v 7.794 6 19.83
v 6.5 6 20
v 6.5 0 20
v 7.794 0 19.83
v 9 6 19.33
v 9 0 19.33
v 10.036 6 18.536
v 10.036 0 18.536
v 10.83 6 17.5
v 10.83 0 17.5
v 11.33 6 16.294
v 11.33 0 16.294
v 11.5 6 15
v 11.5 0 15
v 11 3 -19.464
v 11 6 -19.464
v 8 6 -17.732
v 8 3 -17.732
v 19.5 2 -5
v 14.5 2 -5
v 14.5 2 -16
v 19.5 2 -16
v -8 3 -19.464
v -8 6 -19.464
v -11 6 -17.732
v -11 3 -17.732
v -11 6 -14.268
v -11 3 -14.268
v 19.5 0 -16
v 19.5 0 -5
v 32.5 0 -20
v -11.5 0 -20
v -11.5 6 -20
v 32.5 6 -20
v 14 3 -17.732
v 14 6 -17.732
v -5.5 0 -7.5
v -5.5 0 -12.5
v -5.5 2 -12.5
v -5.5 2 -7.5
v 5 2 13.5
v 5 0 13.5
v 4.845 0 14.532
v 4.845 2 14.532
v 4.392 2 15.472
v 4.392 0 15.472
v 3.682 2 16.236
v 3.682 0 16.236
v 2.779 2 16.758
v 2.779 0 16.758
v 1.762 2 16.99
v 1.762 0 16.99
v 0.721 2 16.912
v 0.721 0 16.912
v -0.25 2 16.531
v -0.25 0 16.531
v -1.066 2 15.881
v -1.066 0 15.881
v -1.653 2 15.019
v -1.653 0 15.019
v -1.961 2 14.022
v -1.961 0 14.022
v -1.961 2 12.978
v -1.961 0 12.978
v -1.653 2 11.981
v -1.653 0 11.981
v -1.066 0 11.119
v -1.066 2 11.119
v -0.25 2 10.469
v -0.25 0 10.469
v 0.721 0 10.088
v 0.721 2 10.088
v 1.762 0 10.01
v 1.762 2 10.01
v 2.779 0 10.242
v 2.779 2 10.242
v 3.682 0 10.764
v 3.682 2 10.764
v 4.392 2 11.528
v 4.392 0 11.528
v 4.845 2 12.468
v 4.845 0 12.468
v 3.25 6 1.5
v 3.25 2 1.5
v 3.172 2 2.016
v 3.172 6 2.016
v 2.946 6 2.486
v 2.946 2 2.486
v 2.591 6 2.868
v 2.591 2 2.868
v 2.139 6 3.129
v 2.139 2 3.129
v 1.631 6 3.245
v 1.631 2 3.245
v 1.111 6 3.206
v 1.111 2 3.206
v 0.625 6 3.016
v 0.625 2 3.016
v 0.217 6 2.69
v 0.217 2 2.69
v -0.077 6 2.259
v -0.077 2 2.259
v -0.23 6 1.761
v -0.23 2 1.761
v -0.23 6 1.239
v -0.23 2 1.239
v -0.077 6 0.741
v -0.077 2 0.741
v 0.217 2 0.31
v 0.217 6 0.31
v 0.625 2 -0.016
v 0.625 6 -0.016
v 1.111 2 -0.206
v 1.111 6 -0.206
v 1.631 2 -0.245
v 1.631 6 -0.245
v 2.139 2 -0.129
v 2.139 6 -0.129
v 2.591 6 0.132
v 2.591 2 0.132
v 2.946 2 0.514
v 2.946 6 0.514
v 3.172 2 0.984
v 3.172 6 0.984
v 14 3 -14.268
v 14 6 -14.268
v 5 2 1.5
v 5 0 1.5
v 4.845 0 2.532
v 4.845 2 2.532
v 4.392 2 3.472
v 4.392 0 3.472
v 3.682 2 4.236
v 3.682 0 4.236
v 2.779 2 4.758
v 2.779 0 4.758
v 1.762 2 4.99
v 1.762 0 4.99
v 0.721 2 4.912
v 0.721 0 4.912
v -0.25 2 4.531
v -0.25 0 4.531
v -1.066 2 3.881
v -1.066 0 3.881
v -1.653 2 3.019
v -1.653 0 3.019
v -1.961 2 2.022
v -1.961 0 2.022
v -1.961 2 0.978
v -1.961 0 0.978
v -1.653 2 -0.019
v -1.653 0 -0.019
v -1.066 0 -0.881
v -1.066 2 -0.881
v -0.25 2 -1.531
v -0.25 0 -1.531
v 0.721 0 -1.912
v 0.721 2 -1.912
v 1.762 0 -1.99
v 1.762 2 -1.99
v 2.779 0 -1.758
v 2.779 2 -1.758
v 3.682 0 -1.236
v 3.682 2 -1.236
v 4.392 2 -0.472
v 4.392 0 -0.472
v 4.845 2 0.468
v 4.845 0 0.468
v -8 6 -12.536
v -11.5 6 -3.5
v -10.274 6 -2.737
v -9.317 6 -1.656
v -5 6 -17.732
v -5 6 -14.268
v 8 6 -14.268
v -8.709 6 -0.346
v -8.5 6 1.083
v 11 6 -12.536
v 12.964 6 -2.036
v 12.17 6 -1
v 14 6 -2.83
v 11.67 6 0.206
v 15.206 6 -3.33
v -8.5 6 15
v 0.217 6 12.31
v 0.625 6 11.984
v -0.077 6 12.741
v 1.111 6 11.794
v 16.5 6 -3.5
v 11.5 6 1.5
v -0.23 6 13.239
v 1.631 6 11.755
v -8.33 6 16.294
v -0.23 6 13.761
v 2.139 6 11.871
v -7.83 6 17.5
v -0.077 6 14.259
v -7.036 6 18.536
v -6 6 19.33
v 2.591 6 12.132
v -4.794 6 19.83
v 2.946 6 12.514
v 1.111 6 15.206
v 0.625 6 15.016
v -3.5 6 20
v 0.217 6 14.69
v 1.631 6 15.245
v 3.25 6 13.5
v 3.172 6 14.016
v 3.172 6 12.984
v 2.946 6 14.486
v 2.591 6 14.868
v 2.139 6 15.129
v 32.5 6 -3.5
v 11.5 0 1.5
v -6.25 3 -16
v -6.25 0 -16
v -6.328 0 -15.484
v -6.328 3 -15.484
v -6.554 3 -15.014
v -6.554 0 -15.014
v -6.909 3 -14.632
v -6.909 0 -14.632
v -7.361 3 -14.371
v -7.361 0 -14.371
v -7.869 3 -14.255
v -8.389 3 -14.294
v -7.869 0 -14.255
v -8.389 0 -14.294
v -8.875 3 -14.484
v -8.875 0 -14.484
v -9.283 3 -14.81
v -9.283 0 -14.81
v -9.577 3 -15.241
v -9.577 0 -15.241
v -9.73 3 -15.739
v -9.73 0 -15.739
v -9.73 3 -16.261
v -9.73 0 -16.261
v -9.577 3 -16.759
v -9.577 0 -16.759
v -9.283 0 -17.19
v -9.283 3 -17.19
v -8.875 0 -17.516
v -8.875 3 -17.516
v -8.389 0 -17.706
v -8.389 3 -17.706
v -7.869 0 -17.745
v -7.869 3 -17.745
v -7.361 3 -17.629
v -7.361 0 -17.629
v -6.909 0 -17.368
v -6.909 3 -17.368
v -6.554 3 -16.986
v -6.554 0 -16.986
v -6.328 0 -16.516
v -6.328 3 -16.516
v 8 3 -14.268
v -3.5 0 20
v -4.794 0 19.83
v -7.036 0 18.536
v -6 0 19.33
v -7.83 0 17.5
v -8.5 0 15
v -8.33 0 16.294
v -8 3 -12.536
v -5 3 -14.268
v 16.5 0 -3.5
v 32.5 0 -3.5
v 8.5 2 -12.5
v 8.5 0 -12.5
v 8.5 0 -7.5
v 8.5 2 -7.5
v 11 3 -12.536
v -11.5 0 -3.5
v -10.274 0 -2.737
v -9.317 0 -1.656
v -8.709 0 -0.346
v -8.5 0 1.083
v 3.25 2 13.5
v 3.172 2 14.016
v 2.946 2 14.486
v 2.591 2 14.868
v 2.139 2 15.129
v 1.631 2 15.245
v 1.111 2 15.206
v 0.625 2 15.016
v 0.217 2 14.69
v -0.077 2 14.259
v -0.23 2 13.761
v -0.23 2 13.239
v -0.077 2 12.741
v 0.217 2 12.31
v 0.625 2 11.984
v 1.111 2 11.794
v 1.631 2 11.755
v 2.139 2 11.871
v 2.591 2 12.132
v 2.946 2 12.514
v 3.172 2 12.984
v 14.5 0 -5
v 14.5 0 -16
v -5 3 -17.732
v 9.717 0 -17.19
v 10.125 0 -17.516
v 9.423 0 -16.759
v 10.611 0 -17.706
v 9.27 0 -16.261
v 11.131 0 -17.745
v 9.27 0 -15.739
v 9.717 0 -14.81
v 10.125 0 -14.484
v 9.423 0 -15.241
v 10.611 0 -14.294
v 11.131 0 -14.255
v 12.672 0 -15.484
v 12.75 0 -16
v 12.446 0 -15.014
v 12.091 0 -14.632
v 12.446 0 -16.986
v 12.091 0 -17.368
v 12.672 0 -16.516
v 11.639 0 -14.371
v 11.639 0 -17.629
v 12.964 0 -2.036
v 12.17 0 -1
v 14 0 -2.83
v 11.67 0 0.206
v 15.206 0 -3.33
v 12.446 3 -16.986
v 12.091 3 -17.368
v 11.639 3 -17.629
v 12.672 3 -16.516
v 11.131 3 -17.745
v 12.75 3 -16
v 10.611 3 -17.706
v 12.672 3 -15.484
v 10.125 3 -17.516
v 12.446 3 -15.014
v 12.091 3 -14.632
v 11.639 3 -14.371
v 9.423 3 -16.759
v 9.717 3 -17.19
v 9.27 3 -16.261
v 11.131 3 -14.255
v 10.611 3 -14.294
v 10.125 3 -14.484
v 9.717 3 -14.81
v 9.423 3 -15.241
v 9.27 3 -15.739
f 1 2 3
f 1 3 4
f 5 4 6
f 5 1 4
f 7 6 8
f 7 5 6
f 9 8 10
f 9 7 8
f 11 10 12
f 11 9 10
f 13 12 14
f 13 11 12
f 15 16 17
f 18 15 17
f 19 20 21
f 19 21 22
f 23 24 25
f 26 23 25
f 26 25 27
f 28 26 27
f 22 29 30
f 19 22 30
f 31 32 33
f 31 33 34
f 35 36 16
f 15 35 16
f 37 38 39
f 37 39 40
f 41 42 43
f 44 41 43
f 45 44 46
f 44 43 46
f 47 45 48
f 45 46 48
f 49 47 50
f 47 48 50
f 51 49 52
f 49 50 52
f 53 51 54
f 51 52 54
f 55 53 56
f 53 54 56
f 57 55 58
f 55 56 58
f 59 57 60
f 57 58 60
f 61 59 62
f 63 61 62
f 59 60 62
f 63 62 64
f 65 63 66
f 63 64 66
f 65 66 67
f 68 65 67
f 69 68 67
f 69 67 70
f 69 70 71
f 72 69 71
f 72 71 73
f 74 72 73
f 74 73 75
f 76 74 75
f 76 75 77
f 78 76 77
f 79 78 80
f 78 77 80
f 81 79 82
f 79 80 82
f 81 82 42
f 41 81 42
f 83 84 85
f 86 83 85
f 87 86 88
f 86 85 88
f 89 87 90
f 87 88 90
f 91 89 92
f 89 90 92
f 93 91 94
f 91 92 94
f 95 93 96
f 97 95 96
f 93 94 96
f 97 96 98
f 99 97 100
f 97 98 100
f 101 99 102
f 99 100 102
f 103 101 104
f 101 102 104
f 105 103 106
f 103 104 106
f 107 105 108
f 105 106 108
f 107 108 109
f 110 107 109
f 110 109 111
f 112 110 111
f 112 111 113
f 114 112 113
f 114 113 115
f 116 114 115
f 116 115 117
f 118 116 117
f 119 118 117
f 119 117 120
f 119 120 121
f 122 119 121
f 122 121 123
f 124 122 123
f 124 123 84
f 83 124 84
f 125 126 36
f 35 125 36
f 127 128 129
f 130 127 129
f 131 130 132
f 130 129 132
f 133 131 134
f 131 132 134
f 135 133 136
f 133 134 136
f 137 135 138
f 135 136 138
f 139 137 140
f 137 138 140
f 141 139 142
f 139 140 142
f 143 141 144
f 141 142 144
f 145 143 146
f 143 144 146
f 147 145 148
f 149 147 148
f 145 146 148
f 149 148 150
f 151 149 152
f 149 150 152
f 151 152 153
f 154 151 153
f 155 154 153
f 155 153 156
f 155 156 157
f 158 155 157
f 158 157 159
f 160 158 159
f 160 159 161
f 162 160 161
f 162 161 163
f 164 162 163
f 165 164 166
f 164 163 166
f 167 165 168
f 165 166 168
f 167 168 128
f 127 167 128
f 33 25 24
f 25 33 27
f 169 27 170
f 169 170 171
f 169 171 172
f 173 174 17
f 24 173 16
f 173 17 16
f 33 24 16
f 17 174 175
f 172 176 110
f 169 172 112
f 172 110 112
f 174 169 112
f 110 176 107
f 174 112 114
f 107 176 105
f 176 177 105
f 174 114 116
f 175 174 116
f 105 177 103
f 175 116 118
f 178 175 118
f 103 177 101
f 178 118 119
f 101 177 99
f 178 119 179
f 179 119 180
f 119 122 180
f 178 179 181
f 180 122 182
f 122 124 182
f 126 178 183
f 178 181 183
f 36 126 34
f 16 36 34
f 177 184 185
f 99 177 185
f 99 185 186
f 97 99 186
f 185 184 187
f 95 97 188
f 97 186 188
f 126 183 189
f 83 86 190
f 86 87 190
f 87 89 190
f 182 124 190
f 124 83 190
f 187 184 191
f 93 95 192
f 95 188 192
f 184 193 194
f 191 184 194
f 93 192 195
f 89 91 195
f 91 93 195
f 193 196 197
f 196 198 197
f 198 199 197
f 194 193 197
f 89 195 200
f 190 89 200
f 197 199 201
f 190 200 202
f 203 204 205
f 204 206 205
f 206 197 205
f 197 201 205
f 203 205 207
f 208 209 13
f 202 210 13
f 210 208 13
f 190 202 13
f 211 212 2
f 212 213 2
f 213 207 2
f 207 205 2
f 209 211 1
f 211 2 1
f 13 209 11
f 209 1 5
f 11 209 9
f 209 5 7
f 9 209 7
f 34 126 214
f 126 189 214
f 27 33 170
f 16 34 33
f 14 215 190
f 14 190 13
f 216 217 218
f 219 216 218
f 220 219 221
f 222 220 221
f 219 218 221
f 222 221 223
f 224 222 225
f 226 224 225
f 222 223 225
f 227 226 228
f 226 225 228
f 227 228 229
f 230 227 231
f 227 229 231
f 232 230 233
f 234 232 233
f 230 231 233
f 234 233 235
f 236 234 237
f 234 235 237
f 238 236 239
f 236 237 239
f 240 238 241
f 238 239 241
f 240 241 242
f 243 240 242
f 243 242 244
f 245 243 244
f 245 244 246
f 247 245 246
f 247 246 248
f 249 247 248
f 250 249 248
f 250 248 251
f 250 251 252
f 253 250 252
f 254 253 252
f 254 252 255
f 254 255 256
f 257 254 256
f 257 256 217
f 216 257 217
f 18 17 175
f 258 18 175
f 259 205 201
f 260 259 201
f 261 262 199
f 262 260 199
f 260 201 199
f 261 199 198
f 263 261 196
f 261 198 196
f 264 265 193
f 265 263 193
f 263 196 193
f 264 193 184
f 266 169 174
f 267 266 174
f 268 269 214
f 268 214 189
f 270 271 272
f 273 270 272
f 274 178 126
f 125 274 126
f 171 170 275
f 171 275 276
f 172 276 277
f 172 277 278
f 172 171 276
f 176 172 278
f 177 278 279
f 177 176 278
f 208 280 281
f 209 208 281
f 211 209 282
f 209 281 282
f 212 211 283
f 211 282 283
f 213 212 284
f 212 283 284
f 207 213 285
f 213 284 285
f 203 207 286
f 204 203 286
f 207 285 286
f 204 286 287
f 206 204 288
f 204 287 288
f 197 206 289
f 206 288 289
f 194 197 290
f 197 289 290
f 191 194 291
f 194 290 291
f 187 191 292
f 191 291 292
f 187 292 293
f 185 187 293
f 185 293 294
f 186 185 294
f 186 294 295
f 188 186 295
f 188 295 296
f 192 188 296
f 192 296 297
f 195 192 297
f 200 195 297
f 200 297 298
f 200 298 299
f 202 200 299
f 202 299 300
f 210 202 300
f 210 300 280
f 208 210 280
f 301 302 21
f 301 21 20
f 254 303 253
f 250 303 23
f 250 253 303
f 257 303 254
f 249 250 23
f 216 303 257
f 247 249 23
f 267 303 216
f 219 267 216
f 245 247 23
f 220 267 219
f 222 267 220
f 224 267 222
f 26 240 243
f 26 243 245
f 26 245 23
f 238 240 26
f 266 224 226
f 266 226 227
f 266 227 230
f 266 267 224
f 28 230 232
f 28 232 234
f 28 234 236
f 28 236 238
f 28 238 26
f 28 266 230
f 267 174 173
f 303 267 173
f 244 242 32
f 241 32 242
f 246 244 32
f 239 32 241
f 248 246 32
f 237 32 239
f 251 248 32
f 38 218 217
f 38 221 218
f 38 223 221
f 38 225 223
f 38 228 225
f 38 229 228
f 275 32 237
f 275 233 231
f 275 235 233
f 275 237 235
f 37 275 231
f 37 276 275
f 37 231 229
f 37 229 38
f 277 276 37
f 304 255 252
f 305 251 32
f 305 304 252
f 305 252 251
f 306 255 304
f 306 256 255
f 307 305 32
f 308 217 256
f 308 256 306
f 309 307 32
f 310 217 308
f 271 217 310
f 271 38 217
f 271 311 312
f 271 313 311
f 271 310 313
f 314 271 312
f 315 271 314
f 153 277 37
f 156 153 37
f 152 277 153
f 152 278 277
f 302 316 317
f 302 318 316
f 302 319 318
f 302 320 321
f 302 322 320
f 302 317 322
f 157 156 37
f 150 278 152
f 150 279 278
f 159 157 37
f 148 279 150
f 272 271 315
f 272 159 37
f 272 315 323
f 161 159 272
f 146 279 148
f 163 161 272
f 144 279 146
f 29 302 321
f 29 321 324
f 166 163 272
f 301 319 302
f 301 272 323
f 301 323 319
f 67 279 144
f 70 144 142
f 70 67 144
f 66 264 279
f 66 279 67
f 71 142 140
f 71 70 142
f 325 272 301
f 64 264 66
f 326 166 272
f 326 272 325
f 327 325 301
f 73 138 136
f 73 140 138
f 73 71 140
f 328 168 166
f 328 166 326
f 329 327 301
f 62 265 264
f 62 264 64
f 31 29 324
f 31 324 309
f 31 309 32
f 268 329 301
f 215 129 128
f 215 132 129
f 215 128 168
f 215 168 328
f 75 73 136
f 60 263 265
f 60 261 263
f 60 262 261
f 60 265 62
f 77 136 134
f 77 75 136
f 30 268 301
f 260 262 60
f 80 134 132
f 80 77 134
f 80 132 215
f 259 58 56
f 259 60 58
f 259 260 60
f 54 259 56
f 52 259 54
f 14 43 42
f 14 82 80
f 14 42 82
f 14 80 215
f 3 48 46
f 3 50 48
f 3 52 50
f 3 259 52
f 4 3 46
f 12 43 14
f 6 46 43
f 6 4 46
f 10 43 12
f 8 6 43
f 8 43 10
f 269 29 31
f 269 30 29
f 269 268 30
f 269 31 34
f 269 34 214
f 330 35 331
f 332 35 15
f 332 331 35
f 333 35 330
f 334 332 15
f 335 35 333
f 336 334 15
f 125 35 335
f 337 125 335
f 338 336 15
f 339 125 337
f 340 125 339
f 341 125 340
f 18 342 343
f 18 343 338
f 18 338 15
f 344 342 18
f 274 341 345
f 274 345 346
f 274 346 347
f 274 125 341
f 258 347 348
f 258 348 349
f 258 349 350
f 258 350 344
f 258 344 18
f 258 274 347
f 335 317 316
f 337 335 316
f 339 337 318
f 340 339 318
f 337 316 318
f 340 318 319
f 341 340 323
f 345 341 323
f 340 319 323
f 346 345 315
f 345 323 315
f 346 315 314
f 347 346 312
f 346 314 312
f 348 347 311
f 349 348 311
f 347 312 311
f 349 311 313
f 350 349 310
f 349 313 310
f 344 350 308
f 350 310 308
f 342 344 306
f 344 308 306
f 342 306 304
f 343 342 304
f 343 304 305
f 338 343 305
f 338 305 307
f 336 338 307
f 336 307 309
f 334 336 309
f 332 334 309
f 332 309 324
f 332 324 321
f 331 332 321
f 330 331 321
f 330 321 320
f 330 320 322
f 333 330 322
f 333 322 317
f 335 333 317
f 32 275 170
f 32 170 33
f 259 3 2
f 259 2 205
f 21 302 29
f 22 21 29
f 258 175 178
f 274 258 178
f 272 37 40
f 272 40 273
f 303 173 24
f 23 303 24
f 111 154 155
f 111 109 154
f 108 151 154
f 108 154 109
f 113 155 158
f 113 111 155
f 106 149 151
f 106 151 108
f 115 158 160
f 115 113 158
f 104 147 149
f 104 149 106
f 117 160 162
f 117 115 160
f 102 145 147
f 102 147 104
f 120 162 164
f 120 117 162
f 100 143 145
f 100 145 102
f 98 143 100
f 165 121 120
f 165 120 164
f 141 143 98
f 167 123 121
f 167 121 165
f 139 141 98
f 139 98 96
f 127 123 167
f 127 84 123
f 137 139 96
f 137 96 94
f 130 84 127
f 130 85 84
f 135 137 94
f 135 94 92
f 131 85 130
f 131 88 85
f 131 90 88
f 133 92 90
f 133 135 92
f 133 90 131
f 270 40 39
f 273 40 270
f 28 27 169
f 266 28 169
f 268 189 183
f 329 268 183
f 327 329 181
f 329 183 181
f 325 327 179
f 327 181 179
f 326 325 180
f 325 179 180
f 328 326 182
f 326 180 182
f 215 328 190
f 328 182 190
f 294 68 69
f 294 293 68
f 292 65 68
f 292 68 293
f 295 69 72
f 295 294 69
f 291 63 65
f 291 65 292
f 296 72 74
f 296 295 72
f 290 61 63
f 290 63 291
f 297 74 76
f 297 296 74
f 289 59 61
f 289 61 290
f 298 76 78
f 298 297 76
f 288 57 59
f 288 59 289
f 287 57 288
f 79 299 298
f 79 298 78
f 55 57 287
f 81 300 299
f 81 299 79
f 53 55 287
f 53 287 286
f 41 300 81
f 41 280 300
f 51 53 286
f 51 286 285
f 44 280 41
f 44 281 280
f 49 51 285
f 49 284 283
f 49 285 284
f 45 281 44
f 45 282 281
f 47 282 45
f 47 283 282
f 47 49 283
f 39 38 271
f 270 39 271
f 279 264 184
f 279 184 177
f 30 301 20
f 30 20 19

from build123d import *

# Parameters (mm, degrees)
F0_R        = 1.75
F0_W        = 14
F0_H        = 5
F0_W_2      = 5
F0_H_2      = 11
F0_R_2      = 3.5
F1_DEPTH    = 6
F2_DEPTH    = 2
F4_DEPTH    = 3
F5_T1_DEPTH = 6
F5_T3_DEPTH = 6
F5_T5_DEPTH = 31
F5_T7_DEPTH = 31


# Not quite as in the source:
# - a fillet or chamfer that OpenCascade refuses, or shapes differently, is made with other operations: its cross-section is extruded or revolved along the edge and cut away or added


with BuildPart() as f1:
    # F0 (on Front) → F1 (new body)
    with BuildSketch(Plane.XZ):
        Polygon((-11.5, -20), (32.5, -20), (32.5, -3.5), (11.5, -3.5), (11.5, 20), (-8.5, 20), (-8.5, -3.5), (-11.5, -3.5), align=None)
        with Locations((-8, -16)):
            Circle(F0_R, mode=Mode.SUBTRACT)
        with Locations((1.5, -10)):
            Rectangle(F0_W, F0_H, mode=Mode.SUBTRACT)
        with Locations((11, -16)):
            Circle(F0_R, mode=Mode.SUBTRACT)
        with Locations((17, -10.5)):
            Rectangle(F0_W_2, F0_H_2, mode=Mode.SUBTRACT)
        with Locations((1.5, 1.5)):
            Circle(F0_R_2, mode=Mode.SUBTRACT)
        with Locations((1.5, 13.5)):
            Circle(F0_R_2, mode=Mode.SUBTRACT)
        with Locations((1.5, -10)):
            Rectangle(F0_W, F0_H)
        with Locations((17, -10.5)):
            Rectangle(F0_W_2, F0_H_2)
        with Locations((1.5, 1.5)):
            Circle(F0_R_2)
        with Locations((1.5, 1.5)):
            Circle(F0_R, mode=Mode.SUBTRACT)
        with Locations((1.5, 13.5)):
            Circle(F0_R_2)
        with Locations((1.5, 13.5)):
            Circle(F0_R, mode=Mode.SUBTRACT)
    extrude(amount=-F1_DEPTH)

    # F0 (on Front) → F2 (cut)
    with BuildSketch(Plane.XZ):
        with Locations((17, -10.5)):
            Rectangle(F0_W_2, F0_H_2)
        with Locations((1.5, -10)):
            Rectangle(F0_W, F0_H)
        with Locations((1.5, 13.5)):
            Circle(F0_R_2)
        with Locations((1.5, 13.5)):
            Circle(F0_R, mode=Mode.SUBTRACT)
        with Locations((1.5, 1.5)):
            Circle(F0_R_2)
        with Locations((1.5, 1.5)):
            Circle(F0_R, mode=Mode.SUBTRACT)
    extrude(amount=-F2_DEPTH, mode=Mode.SUBTRACT)

    # F3 (on face) → F4 (cut)
    with BuildSketch(Plane(origin=(0, 6, 0), x_dir=(-1, 0, 0), z_dir=(0, 1, 0))):
        Polygon((-11, -12.5358983849), (-14, -14.2679491924), (-14, -17.7320508076), (-11, -19.4641016151), (-8, -17.7320508076), (-8, -14.2679491924), align=None)
        Polygon((5, -14.2679491924), (5, -17.7320508076), (8, -19.4641016151), (11, -17.7320508076), (11, -14.2679491924), (8, -12.5358983849), align=None)
    extrude(amount=-F4_DEPTH, mode=Mode.SUBTRACT)

    # F5: fillet of radius 5 on 4 edges, made by hand

    # F5_s2 → F5_t1 (join)
    with BuildSketch(Plane.XZ.offset(-6)):
        with BuildLine():
            ThreePointArc((-11.5, -3.5), (-9.3166998673, -1.6560370926), (-8.5, 1.082575695))
            Line((-8.5, 1.082575695), (-8.5, -3.5))
            Line((-8.5, -3.5), (-11.5, -3.5))
        make_face()
    extrude(amount=F5_T1_DEPTH)

    # F5_s4 → F5_t3 (join)
    with BuildSketch(Plane.XZ.offset(-6)):
        with BuildLine():
            ThreePointArc((16.5, -3.5), (12.9644660941, -2.0355339059), (11.5, 1.5))
            Line((11.5, 1.5), (11.5, -3.5))
            Line((11.5, -3.5), (16.5, -3.5))
        make_face()
    extrude(amount=F5_T3_DEPTH)

    # F5_s6 → F5_t5 (cut)
    with BuildSketch(Plane.XZ.offset(-18.5)):
        with BuildLine():
            ThreePointArc((-3.5, 20), (-7.0355339059, 18.5355339059), (-8.5, 15))
            Line((-8.5, 15), (-8.5, 20))
            Line((-8.5, 20), (-3.5, 20))
        make_face()
    extrude(amount=F5_T5_DEPTH, mode=Mode.SUBTRACT)

    # F5_s8 → F5_t7 (cut)
    with BuildSketch(Plane.XZ.offset(-18.5)):
        with BuildLine():
            ThreePointArc((6.5, 20), (10.0355339059, 18.5355339059), (11.5, 15))
            Line((11.5, 15), (11.5, 20))
            Line((11.5, 20), (6.5, 20))
        make_face()
    extrude(amount=F5_T7_DEPTH, mode=Mode.SUBTRACT)


solid = f1.part
